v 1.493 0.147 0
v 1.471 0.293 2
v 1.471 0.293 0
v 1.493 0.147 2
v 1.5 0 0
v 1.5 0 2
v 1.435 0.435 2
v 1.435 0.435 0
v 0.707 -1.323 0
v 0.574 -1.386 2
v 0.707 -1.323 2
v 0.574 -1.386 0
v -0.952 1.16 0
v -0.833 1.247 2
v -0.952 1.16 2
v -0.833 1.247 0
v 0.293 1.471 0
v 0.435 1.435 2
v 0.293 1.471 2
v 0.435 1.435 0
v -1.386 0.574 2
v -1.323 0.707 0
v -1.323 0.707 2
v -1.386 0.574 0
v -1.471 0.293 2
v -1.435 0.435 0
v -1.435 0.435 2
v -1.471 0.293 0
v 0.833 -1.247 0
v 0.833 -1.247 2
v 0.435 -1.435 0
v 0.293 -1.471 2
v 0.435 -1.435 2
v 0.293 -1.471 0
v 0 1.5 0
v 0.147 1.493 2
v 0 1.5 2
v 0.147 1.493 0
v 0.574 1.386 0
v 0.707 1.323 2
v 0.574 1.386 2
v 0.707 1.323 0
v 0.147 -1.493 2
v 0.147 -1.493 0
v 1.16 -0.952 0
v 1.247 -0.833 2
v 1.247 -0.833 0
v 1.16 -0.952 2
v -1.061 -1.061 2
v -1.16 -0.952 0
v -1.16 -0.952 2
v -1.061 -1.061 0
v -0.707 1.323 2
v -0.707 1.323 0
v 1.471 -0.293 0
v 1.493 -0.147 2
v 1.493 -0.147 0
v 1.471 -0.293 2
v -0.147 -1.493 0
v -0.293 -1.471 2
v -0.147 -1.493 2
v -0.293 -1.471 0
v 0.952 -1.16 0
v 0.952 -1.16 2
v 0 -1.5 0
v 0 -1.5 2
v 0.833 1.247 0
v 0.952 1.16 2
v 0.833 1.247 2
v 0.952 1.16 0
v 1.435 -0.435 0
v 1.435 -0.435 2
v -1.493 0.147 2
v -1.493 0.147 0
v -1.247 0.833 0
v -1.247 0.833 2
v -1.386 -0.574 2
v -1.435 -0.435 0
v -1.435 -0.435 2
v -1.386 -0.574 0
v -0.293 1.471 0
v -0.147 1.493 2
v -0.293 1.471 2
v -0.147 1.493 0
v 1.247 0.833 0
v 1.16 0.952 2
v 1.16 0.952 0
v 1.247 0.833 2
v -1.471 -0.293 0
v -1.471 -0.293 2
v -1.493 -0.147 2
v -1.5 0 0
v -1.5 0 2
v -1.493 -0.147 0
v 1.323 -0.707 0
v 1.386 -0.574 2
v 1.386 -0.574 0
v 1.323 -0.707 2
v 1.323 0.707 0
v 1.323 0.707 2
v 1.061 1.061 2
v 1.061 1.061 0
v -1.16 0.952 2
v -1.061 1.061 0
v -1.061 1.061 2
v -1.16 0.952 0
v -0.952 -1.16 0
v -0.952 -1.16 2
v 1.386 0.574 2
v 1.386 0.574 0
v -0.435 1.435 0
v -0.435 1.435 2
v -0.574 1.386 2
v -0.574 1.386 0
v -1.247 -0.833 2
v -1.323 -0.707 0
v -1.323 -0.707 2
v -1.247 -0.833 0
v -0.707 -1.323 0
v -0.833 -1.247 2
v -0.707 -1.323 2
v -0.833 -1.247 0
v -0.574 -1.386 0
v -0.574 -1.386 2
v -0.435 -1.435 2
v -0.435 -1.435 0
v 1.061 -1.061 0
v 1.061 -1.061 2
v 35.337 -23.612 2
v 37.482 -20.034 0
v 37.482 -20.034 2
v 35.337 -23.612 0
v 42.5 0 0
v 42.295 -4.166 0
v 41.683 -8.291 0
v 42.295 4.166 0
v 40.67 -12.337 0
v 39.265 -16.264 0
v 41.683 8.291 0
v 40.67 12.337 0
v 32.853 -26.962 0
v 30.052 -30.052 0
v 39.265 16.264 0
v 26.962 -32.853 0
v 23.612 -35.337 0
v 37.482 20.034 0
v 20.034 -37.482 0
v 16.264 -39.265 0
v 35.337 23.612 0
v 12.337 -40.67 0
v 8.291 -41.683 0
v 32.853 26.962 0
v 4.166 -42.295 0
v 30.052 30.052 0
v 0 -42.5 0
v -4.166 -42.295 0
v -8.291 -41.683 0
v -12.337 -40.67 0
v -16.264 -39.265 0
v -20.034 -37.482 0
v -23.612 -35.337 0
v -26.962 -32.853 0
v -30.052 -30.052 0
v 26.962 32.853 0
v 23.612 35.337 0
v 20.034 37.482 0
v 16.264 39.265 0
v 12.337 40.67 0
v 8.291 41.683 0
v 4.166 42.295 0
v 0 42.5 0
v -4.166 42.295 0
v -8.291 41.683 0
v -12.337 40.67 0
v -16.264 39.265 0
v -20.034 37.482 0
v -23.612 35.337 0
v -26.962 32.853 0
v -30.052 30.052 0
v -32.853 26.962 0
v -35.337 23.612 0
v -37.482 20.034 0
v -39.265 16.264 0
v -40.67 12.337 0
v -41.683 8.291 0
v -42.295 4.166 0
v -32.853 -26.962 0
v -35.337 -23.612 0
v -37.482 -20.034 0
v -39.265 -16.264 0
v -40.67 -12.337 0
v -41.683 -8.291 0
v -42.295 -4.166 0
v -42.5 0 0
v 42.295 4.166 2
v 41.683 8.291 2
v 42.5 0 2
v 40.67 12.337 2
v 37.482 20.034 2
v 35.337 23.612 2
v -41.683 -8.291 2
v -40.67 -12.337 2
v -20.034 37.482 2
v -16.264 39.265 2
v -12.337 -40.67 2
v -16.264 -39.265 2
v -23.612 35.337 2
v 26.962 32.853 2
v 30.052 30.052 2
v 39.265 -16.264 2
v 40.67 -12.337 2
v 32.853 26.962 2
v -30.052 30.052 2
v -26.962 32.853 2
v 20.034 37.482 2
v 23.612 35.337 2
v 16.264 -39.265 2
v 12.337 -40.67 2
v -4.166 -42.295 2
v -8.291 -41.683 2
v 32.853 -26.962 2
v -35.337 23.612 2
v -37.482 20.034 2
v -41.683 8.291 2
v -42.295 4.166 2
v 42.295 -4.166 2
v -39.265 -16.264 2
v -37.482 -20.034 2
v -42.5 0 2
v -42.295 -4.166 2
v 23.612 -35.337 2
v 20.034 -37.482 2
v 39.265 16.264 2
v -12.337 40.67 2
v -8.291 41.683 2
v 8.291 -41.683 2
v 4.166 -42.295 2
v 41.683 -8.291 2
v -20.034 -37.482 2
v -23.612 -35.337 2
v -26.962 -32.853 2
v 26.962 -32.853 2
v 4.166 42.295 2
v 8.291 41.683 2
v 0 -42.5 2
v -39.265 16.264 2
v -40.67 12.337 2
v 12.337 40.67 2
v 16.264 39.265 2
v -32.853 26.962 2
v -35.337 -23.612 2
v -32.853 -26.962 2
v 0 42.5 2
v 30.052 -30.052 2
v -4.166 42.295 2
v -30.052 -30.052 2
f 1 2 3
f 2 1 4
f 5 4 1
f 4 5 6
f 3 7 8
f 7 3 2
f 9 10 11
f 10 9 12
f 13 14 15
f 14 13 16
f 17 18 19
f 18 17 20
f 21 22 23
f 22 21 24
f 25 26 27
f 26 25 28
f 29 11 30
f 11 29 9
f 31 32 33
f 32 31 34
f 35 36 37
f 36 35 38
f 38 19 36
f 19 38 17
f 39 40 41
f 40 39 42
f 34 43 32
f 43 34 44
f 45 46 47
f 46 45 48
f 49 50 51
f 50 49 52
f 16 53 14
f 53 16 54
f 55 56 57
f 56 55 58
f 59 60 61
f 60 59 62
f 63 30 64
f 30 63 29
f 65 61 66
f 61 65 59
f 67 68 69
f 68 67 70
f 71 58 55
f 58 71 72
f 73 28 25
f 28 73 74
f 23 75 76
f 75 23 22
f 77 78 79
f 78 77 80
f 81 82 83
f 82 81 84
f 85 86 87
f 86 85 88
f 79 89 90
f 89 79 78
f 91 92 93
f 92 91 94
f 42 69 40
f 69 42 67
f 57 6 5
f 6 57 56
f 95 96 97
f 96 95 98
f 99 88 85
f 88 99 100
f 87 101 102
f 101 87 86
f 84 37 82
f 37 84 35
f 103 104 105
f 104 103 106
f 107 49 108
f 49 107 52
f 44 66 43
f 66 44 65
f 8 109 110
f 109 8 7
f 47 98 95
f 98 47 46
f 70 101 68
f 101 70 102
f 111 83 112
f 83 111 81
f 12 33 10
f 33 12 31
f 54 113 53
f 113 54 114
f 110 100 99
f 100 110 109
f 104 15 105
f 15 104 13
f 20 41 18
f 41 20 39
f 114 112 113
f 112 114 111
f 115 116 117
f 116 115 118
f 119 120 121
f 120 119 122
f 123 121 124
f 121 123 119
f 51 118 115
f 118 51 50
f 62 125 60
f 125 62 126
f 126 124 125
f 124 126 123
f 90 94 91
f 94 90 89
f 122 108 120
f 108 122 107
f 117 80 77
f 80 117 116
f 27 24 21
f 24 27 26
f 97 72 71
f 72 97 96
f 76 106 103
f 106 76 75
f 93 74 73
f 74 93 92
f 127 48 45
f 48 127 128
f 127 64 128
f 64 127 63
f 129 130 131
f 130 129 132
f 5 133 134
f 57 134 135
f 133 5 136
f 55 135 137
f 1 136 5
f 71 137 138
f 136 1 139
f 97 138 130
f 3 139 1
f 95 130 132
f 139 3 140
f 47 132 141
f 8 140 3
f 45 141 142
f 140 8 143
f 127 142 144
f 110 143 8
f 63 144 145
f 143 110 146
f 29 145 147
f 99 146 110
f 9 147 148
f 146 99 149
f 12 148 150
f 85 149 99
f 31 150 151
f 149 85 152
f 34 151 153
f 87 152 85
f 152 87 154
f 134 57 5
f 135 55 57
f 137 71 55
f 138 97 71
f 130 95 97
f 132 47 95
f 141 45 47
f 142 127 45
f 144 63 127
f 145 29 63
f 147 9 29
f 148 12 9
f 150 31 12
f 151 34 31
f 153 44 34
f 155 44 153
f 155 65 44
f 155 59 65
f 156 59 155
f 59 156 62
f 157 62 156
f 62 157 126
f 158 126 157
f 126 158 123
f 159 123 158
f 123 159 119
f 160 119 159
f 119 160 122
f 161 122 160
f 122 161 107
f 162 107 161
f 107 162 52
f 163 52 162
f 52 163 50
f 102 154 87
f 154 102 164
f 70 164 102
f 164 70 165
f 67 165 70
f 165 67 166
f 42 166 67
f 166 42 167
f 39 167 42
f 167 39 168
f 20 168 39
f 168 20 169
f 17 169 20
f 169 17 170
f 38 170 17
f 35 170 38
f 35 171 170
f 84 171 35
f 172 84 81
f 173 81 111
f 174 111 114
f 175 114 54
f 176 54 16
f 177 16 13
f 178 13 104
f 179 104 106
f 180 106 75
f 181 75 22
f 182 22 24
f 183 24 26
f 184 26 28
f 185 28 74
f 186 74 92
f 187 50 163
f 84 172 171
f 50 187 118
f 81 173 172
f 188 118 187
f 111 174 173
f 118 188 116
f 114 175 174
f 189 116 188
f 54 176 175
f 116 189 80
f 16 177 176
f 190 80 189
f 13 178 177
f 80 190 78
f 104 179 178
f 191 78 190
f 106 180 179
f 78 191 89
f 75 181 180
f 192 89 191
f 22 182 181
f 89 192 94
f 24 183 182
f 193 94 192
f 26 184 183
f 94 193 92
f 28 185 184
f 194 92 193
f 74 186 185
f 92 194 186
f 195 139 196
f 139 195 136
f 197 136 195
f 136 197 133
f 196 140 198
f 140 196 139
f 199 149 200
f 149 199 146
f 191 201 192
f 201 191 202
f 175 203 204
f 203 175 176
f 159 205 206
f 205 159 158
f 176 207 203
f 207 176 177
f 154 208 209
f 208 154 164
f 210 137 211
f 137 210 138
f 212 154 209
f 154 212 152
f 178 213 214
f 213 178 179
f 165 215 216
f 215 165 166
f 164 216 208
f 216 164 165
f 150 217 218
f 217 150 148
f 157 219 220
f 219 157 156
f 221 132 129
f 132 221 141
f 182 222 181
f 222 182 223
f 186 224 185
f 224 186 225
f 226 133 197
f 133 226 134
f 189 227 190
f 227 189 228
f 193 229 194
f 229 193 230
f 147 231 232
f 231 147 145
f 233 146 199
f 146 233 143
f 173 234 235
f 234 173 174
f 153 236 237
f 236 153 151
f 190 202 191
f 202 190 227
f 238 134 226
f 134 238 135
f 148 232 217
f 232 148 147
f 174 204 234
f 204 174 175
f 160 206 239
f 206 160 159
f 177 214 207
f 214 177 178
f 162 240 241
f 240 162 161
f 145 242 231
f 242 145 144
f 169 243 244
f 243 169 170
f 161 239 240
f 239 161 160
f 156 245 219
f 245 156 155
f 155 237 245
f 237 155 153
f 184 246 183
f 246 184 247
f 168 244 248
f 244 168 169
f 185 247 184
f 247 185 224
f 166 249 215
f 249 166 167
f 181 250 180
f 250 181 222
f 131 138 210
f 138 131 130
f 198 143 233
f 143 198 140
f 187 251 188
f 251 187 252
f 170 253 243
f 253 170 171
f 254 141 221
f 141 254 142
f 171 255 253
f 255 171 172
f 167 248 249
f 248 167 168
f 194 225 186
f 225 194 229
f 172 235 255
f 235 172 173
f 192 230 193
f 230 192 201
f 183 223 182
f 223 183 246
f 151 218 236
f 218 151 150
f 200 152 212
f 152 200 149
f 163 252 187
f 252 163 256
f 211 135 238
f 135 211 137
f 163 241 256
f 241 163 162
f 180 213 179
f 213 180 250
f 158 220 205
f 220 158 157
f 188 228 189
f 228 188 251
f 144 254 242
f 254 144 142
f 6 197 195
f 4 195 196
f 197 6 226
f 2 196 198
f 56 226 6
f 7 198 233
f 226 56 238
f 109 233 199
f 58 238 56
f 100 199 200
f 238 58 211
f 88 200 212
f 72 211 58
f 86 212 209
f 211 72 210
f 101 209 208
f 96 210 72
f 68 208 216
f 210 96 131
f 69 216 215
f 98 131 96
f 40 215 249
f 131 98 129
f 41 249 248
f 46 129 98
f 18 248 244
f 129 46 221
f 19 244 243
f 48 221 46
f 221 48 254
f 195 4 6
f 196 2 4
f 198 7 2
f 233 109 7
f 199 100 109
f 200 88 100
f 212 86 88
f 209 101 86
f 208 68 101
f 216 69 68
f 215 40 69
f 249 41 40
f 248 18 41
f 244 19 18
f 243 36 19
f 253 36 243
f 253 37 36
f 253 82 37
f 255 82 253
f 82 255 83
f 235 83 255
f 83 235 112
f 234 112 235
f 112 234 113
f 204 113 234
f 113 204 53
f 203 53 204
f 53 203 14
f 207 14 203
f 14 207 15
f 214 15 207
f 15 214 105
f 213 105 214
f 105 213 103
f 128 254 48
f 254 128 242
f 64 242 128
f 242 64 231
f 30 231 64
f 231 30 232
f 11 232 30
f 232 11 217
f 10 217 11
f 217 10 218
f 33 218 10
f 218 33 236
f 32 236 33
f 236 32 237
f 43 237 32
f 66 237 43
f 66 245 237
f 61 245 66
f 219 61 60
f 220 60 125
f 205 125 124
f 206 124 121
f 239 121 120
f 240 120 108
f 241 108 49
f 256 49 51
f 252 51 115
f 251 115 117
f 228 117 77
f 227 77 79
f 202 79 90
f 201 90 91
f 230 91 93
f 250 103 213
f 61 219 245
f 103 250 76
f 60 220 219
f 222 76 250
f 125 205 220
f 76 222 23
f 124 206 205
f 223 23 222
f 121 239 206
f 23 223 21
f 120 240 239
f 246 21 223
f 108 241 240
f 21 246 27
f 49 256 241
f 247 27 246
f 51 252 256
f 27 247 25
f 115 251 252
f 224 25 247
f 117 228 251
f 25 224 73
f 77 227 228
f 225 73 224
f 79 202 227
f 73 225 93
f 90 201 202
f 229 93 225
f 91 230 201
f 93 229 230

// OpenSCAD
// Built by bench/smallmodels/features/compiler.py from a list of features.
$fn = 64;
difference() {
  union() {
    translate([0, 0, 0]) cylinder(d = 85, h = 2);
  }
  union() {
    translate([0, 0, -1]) rotate([0, 0, 0]) cylinder(d = 3, h = 4);
    translate([-45, -45, -1]) rotate([0, 0, 0]) cylinder(d = 3, h = 4);
    translate([0, -45, -1]) rotate([0, 0, 0]) cylinder(d = 3, h = 4);
    translate([45, -45, -1]) rotate([0, 0, 0]) cylinder(d = 3, h = 4);
    translate([-45, 0, -1]) rotate([0, 0, 0]) cylinder(d = 3, h = 4);
    translate([45, 0, -1]) rotate([0, 0, 0]) cylinder(d = 3, h = 4);
    translate([-45, 45, -1]) rotate([0, 0, 0]) cylinder(d = 3, h = 4);
    translate([0, 45, -1]) rotate([0, 0, 0]) cylinder(d = 3, h = 4);
    translate([45, 45, -1]) rotate([0, 0, 0]) cylinder(d = 3, h = 4);
  }
}
